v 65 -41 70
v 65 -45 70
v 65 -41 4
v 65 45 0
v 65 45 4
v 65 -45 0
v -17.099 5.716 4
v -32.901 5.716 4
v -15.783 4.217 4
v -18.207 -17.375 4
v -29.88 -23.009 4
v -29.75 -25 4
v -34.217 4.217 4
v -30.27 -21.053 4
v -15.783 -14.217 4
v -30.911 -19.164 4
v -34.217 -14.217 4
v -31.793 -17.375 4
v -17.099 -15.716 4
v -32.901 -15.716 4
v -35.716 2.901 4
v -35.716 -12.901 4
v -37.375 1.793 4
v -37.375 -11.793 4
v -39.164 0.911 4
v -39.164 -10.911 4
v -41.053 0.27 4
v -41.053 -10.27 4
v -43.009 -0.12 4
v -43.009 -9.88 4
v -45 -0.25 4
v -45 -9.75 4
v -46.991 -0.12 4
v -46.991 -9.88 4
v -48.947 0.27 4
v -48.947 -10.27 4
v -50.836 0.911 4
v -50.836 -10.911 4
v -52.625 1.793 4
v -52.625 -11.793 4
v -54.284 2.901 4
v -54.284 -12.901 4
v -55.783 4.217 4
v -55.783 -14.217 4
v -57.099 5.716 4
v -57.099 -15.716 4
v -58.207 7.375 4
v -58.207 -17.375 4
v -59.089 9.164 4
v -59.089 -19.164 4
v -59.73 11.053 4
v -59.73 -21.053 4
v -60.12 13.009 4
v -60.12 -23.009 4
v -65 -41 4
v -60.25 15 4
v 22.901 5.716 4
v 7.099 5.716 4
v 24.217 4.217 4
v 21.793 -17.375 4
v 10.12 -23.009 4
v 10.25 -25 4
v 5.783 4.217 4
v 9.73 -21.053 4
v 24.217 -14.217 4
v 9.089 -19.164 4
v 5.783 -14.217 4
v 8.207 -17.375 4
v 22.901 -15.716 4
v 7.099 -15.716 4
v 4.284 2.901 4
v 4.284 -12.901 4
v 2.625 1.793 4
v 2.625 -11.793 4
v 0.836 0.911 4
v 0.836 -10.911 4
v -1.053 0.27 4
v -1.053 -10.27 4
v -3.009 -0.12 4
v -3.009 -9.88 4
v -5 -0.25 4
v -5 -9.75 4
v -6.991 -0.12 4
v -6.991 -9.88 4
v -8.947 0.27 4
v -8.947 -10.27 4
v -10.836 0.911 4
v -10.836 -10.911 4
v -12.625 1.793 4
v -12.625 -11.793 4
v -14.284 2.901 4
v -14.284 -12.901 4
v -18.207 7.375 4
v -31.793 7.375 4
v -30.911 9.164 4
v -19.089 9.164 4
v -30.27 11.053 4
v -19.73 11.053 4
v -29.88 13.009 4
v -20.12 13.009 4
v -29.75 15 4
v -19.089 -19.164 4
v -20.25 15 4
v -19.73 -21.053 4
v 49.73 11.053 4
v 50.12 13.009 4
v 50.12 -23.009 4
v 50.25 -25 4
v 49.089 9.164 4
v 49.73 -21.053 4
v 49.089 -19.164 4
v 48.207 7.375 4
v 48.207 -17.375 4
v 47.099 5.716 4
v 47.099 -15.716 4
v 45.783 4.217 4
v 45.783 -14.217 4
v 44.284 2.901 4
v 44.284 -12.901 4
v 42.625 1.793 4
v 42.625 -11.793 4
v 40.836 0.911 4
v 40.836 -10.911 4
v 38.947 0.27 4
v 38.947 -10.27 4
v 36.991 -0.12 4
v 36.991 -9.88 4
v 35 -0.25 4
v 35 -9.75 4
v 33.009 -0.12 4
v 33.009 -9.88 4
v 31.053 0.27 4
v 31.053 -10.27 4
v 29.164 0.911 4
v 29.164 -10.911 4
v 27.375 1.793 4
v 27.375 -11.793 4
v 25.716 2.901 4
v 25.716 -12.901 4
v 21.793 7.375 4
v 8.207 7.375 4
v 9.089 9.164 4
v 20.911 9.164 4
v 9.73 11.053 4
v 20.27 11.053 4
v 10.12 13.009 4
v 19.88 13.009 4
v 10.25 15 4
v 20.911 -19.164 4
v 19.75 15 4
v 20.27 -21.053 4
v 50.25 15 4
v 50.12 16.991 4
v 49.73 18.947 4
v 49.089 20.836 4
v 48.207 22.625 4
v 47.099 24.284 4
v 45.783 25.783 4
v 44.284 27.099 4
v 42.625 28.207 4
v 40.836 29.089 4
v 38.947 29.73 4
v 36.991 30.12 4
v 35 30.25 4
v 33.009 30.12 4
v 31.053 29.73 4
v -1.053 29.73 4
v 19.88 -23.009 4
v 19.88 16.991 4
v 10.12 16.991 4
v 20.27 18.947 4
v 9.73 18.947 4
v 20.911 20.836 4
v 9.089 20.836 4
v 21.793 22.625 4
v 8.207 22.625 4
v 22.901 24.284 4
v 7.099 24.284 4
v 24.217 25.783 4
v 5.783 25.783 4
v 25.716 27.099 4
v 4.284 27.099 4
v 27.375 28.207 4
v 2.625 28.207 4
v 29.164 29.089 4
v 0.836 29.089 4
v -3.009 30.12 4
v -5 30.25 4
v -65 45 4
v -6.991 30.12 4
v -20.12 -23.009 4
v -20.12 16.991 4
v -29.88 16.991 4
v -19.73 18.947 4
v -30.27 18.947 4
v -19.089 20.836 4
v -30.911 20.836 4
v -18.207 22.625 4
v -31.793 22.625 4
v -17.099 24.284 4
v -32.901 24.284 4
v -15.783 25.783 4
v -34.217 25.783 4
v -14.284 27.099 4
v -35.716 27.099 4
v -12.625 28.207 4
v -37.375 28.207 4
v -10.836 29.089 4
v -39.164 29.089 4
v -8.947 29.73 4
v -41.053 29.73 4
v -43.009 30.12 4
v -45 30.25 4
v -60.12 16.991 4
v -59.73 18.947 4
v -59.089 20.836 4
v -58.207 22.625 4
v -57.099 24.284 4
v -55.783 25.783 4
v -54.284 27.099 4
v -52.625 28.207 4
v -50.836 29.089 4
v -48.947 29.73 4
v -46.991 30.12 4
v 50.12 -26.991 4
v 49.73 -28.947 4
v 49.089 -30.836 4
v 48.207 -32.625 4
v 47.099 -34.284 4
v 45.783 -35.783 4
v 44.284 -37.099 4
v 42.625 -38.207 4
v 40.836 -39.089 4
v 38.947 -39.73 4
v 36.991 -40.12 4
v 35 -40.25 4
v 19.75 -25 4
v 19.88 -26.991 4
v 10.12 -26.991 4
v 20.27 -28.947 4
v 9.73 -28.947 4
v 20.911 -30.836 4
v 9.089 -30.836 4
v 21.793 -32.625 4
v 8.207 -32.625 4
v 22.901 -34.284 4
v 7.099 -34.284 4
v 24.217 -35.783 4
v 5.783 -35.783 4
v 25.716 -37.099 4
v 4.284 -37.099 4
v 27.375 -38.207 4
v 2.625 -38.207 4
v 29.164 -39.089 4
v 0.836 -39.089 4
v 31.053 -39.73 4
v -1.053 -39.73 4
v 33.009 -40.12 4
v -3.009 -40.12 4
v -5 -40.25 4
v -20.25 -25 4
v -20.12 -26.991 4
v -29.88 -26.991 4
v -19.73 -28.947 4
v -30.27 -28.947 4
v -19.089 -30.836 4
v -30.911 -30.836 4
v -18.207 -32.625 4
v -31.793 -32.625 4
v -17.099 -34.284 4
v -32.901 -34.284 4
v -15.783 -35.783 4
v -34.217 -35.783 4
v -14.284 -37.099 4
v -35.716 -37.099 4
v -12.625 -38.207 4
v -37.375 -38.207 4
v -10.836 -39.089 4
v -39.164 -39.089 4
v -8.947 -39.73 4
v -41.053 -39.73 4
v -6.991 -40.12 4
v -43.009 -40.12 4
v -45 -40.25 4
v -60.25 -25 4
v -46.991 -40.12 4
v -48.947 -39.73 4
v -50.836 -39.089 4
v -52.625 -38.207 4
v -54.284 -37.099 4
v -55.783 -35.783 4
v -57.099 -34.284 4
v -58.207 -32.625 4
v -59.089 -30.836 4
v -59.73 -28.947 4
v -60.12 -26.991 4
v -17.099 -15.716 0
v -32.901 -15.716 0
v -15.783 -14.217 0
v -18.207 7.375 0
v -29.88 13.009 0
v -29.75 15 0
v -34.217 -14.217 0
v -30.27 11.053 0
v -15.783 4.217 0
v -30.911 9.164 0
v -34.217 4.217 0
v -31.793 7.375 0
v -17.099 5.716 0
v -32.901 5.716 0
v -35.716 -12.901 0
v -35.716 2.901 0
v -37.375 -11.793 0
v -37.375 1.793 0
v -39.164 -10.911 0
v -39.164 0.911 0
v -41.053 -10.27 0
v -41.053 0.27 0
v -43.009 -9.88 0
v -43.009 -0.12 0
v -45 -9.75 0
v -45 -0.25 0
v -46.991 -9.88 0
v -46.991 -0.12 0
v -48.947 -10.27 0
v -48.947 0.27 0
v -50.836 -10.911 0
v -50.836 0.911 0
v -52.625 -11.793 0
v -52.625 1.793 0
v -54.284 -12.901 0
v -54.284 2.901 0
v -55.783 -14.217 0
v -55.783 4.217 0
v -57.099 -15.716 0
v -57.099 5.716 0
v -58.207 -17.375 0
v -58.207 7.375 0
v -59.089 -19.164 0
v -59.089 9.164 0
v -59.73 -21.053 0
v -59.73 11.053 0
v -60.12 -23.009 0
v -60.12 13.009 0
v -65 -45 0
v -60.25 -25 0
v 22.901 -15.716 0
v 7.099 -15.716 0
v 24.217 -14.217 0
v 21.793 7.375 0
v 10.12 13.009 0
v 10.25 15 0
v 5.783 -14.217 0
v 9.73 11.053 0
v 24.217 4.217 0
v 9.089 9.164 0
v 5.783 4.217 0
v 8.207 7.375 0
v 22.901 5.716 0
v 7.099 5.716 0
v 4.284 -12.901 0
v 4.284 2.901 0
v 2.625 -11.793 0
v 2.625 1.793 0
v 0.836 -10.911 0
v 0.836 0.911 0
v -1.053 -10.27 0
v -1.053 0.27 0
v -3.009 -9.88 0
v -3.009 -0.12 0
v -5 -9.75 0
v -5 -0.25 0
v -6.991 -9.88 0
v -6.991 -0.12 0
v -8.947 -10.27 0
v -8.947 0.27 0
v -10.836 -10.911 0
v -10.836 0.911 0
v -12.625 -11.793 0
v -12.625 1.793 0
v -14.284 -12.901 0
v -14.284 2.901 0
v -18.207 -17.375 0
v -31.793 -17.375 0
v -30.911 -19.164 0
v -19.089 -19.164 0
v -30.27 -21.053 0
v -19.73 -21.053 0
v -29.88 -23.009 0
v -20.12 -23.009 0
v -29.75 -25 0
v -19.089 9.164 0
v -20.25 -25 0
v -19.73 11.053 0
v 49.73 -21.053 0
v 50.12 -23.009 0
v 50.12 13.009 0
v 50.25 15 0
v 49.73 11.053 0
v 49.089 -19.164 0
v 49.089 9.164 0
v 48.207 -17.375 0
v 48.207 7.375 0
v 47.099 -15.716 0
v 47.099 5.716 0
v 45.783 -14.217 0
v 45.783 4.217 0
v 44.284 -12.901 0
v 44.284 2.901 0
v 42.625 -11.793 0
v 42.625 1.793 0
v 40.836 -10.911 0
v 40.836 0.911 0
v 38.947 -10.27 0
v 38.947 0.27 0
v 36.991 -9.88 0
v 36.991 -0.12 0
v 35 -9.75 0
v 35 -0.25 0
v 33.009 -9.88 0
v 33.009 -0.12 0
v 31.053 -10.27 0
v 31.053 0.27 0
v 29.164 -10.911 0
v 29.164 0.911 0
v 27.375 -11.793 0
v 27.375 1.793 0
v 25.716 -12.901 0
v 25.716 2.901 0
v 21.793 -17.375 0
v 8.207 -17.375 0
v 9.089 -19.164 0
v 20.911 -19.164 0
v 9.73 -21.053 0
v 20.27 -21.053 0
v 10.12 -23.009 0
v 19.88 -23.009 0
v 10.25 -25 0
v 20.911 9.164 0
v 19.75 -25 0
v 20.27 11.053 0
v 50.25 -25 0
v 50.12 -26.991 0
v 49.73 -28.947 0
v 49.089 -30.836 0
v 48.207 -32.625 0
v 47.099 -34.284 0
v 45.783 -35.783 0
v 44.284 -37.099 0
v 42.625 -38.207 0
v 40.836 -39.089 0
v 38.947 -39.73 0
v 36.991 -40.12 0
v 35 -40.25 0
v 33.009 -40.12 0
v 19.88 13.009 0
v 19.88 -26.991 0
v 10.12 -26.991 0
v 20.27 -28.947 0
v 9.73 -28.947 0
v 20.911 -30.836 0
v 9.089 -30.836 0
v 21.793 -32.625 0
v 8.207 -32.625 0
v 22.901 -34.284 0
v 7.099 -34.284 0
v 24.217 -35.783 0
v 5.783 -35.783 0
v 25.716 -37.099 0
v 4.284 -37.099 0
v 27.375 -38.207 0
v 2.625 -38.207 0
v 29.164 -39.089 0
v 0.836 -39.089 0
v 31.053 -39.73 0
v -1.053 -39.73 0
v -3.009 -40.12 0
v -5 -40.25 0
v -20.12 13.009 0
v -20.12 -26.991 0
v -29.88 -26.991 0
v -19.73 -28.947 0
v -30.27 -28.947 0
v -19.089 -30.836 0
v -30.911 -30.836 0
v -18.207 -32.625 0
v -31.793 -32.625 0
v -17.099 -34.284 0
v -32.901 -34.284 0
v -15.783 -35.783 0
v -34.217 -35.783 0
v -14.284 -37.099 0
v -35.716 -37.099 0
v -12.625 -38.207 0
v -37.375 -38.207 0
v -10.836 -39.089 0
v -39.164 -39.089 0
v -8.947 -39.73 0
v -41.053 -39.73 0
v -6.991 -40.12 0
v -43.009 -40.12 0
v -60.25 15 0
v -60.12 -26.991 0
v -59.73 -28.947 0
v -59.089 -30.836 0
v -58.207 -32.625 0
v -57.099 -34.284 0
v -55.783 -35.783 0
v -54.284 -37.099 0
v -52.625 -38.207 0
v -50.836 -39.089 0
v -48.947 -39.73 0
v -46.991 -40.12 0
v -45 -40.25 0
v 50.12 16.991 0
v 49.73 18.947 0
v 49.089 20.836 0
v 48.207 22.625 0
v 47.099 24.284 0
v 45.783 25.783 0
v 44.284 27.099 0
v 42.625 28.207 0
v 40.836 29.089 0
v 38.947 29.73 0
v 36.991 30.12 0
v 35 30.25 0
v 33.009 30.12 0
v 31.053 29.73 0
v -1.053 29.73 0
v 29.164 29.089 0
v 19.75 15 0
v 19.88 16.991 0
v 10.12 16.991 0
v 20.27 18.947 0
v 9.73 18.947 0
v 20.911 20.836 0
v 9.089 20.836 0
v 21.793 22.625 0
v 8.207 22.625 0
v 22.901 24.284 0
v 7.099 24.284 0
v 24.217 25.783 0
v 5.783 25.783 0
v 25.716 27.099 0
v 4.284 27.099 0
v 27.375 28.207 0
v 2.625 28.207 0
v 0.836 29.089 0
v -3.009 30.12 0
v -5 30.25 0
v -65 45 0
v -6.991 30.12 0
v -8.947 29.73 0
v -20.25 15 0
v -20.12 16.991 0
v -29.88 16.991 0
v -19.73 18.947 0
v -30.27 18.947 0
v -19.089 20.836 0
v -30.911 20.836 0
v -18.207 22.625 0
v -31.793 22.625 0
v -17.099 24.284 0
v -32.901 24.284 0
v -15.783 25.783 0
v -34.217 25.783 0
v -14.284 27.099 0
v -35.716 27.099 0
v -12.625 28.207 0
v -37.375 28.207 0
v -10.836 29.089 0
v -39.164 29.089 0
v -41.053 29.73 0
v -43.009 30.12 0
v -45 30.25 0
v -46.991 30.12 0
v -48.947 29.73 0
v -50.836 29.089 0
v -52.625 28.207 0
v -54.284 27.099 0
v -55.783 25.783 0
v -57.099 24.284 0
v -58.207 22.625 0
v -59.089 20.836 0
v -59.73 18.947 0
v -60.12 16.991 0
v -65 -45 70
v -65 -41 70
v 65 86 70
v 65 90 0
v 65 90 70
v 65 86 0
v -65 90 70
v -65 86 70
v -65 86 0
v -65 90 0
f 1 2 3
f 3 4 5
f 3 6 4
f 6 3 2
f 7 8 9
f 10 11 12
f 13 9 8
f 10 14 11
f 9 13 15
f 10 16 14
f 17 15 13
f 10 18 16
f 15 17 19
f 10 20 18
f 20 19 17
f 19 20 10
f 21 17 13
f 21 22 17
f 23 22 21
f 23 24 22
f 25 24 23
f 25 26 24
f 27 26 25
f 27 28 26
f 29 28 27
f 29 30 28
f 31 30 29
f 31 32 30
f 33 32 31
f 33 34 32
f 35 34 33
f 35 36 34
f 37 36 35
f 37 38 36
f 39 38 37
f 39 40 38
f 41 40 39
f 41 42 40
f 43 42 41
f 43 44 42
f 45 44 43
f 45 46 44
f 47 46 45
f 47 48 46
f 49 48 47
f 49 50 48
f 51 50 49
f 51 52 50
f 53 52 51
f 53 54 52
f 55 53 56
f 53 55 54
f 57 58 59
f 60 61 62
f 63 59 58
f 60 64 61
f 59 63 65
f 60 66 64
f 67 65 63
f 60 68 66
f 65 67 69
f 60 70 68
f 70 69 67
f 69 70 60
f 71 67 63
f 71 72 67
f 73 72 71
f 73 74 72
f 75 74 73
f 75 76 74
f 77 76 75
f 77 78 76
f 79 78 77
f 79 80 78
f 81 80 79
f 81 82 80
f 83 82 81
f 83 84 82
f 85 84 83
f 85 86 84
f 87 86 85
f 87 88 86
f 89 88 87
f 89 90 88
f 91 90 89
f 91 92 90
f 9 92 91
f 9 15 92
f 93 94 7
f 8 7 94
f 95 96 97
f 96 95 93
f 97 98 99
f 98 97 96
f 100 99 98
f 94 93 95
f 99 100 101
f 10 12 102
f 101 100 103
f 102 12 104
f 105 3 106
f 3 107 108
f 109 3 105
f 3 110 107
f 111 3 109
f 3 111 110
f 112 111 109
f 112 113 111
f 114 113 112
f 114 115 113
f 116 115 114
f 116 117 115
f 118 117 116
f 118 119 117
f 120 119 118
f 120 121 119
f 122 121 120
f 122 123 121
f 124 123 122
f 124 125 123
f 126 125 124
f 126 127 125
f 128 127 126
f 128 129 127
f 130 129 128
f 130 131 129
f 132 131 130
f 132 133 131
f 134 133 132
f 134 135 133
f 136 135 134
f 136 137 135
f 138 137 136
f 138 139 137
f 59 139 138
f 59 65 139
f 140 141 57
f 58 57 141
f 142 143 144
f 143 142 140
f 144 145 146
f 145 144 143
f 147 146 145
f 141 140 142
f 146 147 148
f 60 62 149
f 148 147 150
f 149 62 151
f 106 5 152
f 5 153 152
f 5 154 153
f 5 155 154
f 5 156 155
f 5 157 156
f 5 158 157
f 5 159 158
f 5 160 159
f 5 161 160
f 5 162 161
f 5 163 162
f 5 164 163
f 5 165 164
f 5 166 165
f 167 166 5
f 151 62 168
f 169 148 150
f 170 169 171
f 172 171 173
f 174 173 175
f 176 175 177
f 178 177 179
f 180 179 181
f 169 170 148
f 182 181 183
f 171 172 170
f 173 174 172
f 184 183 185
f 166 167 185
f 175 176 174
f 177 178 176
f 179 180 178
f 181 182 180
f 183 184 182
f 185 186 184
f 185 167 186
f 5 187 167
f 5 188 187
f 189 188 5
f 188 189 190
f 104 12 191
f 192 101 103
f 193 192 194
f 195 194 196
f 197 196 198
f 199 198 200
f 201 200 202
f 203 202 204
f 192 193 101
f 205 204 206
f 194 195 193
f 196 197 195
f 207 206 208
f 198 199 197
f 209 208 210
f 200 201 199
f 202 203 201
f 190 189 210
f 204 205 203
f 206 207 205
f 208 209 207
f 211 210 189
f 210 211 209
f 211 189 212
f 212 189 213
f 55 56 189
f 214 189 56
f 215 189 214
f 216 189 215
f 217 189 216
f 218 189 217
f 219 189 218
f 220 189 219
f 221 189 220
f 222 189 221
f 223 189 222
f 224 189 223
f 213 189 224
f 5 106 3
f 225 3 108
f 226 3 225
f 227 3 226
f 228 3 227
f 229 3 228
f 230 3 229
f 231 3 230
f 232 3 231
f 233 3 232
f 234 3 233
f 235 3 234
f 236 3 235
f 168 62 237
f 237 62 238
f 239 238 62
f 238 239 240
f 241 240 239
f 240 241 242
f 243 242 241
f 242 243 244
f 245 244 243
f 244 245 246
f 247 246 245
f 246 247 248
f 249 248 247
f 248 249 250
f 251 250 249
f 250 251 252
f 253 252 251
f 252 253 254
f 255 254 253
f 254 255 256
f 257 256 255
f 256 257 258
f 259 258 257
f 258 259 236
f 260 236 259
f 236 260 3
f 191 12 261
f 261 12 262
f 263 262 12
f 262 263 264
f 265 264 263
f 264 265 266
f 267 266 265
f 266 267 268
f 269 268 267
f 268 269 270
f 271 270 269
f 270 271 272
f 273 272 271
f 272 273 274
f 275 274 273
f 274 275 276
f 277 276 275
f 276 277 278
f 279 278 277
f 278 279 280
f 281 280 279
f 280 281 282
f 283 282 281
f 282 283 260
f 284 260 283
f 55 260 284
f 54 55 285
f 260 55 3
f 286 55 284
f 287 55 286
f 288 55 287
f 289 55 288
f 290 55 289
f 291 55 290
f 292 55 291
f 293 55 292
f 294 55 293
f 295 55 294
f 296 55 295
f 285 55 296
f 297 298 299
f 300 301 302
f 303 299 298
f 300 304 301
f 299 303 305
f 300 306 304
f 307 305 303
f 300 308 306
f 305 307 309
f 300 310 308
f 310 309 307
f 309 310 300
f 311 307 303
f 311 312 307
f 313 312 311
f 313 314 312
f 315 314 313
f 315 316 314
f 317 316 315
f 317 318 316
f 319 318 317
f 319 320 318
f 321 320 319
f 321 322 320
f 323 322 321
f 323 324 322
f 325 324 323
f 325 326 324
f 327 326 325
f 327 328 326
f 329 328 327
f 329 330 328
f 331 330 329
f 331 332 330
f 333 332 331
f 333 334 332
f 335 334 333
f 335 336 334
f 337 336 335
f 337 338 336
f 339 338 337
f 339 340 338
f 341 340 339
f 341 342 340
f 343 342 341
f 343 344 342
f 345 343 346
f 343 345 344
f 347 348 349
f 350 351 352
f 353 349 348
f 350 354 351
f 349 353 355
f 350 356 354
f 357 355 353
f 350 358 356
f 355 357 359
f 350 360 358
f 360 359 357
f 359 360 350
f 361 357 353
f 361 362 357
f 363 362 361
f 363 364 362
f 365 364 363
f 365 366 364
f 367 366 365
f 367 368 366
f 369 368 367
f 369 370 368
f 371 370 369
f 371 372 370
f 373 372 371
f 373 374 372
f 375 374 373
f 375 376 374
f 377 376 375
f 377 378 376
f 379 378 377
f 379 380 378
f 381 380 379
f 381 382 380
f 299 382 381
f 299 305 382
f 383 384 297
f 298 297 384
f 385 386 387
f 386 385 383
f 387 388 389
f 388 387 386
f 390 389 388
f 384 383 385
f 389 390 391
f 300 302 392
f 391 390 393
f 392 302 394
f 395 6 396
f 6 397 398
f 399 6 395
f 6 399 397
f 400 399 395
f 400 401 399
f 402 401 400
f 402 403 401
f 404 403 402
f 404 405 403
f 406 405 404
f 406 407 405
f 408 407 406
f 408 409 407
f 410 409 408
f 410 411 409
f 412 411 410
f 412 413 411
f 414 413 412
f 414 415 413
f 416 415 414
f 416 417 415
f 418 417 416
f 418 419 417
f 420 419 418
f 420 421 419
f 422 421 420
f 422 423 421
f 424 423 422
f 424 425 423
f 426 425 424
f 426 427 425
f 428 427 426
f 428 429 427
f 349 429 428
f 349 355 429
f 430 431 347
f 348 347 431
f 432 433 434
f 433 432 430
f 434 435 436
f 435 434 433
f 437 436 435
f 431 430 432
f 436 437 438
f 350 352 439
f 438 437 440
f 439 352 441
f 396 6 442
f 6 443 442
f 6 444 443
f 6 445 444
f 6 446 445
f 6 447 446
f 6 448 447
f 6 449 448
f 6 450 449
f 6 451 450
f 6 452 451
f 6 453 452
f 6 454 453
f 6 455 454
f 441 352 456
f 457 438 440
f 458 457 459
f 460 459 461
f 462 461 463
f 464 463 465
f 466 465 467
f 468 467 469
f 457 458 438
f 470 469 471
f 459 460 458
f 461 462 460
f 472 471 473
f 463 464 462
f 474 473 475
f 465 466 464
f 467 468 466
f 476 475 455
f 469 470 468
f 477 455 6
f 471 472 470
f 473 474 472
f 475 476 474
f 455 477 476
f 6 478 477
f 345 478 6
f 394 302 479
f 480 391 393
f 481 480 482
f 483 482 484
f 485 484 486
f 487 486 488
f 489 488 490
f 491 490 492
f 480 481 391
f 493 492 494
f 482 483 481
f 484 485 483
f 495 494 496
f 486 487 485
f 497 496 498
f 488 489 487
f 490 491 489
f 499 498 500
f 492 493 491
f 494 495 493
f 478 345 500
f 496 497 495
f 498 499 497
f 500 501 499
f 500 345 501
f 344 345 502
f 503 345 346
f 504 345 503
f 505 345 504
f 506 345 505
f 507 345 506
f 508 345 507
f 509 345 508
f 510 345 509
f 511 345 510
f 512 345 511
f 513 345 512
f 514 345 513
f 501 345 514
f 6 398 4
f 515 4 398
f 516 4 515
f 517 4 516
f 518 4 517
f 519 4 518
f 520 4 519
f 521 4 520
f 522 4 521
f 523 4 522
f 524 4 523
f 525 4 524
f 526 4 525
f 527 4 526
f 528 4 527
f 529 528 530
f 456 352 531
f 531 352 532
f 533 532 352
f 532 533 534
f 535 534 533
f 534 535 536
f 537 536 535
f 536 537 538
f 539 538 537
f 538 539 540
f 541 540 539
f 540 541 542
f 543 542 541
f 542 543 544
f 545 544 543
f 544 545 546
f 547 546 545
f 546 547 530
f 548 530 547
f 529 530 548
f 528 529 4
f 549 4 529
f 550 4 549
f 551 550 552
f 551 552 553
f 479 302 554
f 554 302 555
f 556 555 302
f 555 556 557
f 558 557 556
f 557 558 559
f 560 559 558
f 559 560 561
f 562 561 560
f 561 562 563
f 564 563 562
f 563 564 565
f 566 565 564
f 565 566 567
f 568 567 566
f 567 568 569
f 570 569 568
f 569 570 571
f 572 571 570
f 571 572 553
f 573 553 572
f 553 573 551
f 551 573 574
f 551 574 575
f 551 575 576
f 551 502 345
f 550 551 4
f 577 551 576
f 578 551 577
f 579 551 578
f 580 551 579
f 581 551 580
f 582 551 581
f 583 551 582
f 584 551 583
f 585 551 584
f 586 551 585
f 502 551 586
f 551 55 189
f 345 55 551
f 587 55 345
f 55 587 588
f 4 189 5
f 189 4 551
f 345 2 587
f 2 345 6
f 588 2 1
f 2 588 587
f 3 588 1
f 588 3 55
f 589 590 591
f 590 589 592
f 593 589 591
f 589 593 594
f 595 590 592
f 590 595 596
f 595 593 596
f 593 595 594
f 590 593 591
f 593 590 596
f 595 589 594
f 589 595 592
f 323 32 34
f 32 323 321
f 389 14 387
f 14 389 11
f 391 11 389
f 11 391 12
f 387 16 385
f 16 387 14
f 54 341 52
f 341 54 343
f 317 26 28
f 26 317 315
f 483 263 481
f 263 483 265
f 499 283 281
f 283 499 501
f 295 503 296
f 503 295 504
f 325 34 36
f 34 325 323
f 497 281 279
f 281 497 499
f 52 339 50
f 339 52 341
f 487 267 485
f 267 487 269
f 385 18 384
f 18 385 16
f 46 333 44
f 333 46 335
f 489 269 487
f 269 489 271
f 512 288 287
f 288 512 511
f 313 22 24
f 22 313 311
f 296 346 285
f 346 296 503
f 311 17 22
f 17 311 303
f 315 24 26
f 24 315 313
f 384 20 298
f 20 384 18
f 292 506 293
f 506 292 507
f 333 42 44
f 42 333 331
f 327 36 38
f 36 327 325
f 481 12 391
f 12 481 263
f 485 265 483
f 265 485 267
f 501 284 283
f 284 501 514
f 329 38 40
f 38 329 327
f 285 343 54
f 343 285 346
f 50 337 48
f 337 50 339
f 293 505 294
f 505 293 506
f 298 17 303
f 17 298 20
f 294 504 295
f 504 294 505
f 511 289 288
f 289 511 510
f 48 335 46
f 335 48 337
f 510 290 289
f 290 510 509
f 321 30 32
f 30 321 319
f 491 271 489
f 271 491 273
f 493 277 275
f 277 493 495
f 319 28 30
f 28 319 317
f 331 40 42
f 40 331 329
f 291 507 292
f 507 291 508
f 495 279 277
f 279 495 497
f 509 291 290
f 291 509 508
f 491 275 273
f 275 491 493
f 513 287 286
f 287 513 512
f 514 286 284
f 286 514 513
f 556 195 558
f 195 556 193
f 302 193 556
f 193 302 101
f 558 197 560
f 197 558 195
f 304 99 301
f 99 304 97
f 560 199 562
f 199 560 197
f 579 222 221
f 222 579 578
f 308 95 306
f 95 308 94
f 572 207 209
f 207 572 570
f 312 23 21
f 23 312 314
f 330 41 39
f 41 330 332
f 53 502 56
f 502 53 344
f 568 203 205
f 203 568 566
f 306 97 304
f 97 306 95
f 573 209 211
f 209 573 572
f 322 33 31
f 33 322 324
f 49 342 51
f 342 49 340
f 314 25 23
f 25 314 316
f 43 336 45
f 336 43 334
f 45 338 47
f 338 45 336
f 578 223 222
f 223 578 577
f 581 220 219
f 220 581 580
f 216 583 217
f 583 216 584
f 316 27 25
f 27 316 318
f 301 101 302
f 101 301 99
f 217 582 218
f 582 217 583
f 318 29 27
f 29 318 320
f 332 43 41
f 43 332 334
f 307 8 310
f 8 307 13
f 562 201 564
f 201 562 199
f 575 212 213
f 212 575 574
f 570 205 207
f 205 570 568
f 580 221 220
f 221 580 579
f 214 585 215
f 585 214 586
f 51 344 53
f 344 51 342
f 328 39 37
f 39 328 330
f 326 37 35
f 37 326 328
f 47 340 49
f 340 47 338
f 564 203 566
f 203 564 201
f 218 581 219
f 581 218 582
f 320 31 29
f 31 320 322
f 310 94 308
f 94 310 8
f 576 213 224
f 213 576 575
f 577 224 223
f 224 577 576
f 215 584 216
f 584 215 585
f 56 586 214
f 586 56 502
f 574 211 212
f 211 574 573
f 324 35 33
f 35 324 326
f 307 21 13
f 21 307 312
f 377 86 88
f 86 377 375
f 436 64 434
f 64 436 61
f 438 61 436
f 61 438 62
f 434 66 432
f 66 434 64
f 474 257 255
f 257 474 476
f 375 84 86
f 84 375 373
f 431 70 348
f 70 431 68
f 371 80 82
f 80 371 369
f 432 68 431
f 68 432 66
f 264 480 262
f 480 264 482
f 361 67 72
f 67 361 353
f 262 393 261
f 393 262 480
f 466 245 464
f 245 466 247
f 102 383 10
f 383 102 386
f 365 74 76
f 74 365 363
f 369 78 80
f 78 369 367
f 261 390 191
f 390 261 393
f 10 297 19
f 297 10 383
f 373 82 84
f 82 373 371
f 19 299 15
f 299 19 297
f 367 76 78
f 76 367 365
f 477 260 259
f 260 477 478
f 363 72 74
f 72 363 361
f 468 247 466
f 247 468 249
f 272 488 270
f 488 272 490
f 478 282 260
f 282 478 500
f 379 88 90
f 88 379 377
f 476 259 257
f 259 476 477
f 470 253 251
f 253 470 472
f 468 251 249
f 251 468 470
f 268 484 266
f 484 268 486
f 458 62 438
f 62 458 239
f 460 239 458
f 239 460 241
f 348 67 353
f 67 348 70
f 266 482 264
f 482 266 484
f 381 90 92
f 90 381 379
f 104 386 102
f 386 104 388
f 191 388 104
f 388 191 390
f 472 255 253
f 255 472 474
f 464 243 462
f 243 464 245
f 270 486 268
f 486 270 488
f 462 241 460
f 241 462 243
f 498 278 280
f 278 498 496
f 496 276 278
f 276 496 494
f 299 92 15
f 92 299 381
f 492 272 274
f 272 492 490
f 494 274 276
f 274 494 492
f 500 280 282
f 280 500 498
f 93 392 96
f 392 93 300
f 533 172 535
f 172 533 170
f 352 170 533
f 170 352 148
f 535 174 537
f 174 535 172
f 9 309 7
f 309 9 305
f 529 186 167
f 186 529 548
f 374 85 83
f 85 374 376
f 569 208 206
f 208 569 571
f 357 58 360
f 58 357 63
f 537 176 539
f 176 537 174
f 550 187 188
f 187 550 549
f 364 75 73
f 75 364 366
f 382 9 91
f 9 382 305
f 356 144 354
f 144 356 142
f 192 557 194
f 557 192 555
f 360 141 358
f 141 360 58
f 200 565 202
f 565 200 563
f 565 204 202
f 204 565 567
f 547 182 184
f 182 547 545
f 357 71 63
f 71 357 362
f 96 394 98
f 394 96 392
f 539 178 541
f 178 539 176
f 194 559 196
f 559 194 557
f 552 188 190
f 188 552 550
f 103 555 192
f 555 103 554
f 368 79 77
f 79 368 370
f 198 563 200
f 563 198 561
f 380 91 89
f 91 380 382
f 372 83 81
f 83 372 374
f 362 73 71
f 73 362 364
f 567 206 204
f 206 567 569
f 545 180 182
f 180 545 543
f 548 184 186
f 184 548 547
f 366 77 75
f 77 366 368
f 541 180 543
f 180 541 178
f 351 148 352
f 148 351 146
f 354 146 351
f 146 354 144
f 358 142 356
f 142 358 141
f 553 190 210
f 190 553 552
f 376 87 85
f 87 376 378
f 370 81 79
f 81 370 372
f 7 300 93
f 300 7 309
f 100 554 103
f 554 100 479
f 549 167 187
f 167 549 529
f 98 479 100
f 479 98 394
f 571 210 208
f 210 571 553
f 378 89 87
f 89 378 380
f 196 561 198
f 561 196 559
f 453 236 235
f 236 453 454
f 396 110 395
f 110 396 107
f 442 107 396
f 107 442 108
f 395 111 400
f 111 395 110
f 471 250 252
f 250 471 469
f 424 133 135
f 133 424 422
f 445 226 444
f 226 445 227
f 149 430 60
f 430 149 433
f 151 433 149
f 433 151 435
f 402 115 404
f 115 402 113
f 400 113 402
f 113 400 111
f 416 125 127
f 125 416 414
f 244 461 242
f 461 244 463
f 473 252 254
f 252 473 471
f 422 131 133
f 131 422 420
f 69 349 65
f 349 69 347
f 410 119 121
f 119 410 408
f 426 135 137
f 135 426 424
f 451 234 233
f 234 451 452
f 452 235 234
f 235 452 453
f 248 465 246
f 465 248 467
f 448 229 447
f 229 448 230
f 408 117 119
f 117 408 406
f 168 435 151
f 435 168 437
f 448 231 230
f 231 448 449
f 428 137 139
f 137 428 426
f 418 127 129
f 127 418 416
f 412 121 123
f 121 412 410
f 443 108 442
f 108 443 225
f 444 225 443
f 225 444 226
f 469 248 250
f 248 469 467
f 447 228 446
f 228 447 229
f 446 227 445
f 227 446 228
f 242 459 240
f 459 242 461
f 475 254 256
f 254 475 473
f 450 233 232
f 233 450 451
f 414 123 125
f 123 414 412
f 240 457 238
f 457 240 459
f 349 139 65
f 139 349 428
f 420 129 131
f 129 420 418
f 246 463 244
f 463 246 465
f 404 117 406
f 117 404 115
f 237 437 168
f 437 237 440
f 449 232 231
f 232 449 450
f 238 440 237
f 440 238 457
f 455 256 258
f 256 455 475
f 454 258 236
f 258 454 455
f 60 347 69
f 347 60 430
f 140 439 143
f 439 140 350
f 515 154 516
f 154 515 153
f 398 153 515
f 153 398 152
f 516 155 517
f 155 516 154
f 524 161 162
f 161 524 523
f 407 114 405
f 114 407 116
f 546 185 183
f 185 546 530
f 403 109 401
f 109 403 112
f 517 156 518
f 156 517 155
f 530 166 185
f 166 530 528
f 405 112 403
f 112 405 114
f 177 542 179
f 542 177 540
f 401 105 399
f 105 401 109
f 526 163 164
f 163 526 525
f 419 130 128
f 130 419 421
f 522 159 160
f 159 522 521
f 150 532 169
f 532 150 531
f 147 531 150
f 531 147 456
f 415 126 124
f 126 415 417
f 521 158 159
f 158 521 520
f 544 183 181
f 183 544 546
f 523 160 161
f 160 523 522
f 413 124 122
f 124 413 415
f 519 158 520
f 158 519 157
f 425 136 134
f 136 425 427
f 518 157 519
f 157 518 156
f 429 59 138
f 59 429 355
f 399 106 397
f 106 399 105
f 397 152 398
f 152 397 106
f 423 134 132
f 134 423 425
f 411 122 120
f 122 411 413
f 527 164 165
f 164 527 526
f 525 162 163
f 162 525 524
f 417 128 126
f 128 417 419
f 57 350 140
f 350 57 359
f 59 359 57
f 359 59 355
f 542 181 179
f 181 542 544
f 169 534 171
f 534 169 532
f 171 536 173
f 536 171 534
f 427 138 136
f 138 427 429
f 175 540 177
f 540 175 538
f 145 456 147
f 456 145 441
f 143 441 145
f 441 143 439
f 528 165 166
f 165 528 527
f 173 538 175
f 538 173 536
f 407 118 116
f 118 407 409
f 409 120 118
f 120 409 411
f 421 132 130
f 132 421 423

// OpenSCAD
// Tube rack for six 50 mL conical (Falcon-type) tubes - printed upside down and flipped over.
// A flat plate with a 2x3 hole grid and two solid walls runs along the long edges. The two
// short ends are open. The walls and plate form a U-cross section along X. NOVEL general part.
//

cols   = 3;
rows   = 2;
tube_d = 30.5;
pitch_x = 40;
pitch_y = 40;
plate_w = 130;
plate_h = 90;
plate_t = 4;
wall_h = 70;

$fn = 48;

plate_n = cols * rows;

difference() {
    union() {
        translate([-plate_w / 2, -plate_h / 2, 0]) cube([plate_w, plate_h, plate_t]);
        translate([-plate_w / 2, -plate_h / 2, 0]) cube([plate_w, 4, wall_h]);      // left wall
        translate([-plate_w / 2, plate_h - 4, 0]) cube([plate_w, 4, wall_h]);      // right wall
    }
    for (i = [0 : cols - 1], j = [0 : rows - 1])
        translate([
            -plate_w / 2 + pitch_x / 2 + i * pitch_x,
            -plate_h / 2 + pitch_y / 2 + j * pitch_y,
            -1
        ]) cylinder(h = plate_t + 2, d = tube_d);
}
